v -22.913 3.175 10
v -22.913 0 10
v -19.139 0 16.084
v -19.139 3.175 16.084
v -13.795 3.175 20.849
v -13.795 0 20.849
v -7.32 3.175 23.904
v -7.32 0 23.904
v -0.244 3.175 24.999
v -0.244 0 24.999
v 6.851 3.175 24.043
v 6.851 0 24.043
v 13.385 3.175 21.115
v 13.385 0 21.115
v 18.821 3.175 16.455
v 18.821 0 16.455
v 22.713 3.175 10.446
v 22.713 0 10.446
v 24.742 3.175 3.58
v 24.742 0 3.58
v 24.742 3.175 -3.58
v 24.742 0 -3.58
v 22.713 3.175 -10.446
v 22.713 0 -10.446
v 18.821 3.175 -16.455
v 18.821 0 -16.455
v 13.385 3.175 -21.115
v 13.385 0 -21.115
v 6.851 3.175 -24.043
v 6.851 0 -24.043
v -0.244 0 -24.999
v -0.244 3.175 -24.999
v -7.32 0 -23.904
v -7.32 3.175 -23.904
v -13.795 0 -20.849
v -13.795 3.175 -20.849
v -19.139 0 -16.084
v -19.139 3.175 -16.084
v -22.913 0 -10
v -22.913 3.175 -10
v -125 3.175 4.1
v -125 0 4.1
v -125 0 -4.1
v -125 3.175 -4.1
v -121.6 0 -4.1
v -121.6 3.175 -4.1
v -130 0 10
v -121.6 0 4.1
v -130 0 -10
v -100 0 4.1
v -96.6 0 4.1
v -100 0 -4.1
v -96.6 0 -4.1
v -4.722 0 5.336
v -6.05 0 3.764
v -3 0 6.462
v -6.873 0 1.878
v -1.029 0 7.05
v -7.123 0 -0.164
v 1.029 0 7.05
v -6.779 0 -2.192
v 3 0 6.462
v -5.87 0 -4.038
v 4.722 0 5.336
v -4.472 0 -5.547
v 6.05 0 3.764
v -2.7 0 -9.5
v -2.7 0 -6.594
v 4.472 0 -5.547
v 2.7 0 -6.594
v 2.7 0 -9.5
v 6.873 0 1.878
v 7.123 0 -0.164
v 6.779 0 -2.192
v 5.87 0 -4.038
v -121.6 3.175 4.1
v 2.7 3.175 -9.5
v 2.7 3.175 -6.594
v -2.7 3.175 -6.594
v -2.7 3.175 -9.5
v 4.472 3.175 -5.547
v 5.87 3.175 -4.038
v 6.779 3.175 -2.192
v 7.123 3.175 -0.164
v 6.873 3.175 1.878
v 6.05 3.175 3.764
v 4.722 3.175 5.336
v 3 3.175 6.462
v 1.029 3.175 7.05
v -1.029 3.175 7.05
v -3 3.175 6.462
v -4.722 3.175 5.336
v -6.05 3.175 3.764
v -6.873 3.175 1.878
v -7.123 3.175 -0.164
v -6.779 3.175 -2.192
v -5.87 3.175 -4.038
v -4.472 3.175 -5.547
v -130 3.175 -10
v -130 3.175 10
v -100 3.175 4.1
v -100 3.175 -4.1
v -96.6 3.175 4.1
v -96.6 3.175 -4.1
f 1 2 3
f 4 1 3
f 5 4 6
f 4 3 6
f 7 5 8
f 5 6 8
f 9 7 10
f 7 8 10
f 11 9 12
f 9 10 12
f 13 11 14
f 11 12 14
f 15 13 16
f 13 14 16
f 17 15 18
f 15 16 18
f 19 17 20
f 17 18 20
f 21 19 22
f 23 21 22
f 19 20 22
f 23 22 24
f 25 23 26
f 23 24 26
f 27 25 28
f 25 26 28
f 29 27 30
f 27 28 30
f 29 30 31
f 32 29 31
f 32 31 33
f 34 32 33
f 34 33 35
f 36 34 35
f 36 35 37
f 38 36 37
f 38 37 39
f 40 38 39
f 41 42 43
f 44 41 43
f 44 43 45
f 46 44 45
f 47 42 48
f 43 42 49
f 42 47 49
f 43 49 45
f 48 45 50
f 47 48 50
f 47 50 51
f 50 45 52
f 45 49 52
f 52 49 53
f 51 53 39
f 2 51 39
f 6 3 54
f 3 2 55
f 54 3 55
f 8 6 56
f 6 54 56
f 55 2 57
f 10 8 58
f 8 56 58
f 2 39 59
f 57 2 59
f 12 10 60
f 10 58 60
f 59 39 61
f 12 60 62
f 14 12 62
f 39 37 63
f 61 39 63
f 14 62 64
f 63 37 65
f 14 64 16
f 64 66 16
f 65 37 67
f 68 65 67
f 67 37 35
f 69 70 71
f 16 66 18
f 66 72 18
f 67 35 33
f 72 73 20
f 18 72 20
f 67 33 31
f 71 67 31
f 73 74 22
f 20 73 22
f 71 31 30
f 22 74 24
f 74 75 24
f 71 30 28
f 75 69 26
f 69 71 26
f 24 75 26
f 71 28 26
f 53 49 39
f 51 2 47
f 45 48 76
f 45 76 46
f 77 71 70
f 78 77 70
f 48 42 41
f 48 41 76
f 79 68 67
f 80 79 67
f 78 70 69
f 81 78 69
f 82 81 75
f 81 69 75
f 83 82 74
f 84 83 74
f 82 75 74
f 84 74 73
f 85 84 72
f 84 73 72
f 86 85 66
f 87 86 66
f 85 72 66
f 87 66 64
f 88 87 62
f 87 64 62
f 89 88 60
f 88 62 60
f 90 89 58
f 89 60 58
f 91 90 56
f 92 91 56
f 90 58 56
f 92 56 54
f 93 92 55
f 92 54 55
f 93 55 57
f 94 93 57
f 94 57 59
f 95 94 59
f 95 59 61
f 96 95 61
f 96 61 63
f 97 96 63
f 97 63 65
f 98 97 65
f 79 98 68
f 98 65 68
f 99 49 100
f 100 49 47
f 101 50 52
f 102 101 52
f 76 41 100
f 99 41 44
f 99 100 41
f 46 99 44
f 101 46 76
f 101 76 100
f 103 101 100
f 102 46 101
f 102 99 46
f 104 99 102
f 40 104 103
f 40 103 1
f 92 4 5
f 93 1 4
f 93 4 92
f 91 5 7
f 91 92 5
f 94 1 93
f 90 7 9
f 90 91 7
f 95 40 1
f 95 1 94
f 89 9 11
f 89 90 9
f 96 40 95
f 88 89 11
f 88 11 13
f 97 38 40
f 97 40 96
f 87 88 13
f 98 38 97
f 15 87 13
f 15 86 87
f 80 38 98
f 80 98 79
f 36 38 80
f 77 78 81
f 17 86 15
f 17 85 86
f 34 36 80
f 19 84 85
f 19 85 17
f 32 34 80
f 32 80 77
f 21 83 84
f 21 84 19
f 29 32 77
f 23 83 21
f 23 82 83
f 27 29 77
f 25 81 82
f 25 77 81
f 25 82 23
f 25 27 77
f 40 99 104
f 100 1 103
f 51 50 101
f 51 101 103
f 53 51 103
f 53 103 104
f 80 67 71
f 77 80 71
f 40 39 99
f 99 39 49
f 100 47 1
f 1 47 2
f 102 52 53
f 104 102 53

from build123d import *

# Parameters (mm, degrees)
SKETCH1_W           = 3.4
SKETCH1_H           = 8.2
BOSS_EXTRUDE1_DEPTH = 3.175


with BuildPart() as part:
    # Sketch1 → Boss-Extrude1 (new body)
    with BuildSketch(Plane(origin=(0, 0, 0), x_dir=(1, 0, 0), z_dir=(0, 1, 0))):
        with BuildLine():
            ThreePointArc((-22.912878475, -10), (25, 0), (-22.912878475, 10))
            Line((-22.912878475, 10), (-130, 10))
            Line((-130, 10), (-130, -10))
            Line((-130, -10), (-22.912878475, -10))
        make_face()
        with Locations((-123.3, 0)):
            Rectangle(SKETCH1_W, SKETCH1_H, mode=Mode.SUBTRACT)
        with Locations((-98.3, 0)):
            Rectangle(SKETCH1_W, SKETCH1_H, mode=Mode.SUBTRACT)
        with BuildLine():
            Line((-2.7, 6.593604856), (-2.7, 9.5))
            Line((-2.7, 9.5), (2.7, 9.5))
            Line((2.7, 9.5), (2.7, 6.593604856))
            ThreePointArc((2.7, 6.593604856), (0, -7.125), (-2.7, 6.593604856))
        make_face(mode=Mode.SUBTRACT)
    extrude(amount=BOSS_EXTRUDE1_DEPTH)


solid = part.part
